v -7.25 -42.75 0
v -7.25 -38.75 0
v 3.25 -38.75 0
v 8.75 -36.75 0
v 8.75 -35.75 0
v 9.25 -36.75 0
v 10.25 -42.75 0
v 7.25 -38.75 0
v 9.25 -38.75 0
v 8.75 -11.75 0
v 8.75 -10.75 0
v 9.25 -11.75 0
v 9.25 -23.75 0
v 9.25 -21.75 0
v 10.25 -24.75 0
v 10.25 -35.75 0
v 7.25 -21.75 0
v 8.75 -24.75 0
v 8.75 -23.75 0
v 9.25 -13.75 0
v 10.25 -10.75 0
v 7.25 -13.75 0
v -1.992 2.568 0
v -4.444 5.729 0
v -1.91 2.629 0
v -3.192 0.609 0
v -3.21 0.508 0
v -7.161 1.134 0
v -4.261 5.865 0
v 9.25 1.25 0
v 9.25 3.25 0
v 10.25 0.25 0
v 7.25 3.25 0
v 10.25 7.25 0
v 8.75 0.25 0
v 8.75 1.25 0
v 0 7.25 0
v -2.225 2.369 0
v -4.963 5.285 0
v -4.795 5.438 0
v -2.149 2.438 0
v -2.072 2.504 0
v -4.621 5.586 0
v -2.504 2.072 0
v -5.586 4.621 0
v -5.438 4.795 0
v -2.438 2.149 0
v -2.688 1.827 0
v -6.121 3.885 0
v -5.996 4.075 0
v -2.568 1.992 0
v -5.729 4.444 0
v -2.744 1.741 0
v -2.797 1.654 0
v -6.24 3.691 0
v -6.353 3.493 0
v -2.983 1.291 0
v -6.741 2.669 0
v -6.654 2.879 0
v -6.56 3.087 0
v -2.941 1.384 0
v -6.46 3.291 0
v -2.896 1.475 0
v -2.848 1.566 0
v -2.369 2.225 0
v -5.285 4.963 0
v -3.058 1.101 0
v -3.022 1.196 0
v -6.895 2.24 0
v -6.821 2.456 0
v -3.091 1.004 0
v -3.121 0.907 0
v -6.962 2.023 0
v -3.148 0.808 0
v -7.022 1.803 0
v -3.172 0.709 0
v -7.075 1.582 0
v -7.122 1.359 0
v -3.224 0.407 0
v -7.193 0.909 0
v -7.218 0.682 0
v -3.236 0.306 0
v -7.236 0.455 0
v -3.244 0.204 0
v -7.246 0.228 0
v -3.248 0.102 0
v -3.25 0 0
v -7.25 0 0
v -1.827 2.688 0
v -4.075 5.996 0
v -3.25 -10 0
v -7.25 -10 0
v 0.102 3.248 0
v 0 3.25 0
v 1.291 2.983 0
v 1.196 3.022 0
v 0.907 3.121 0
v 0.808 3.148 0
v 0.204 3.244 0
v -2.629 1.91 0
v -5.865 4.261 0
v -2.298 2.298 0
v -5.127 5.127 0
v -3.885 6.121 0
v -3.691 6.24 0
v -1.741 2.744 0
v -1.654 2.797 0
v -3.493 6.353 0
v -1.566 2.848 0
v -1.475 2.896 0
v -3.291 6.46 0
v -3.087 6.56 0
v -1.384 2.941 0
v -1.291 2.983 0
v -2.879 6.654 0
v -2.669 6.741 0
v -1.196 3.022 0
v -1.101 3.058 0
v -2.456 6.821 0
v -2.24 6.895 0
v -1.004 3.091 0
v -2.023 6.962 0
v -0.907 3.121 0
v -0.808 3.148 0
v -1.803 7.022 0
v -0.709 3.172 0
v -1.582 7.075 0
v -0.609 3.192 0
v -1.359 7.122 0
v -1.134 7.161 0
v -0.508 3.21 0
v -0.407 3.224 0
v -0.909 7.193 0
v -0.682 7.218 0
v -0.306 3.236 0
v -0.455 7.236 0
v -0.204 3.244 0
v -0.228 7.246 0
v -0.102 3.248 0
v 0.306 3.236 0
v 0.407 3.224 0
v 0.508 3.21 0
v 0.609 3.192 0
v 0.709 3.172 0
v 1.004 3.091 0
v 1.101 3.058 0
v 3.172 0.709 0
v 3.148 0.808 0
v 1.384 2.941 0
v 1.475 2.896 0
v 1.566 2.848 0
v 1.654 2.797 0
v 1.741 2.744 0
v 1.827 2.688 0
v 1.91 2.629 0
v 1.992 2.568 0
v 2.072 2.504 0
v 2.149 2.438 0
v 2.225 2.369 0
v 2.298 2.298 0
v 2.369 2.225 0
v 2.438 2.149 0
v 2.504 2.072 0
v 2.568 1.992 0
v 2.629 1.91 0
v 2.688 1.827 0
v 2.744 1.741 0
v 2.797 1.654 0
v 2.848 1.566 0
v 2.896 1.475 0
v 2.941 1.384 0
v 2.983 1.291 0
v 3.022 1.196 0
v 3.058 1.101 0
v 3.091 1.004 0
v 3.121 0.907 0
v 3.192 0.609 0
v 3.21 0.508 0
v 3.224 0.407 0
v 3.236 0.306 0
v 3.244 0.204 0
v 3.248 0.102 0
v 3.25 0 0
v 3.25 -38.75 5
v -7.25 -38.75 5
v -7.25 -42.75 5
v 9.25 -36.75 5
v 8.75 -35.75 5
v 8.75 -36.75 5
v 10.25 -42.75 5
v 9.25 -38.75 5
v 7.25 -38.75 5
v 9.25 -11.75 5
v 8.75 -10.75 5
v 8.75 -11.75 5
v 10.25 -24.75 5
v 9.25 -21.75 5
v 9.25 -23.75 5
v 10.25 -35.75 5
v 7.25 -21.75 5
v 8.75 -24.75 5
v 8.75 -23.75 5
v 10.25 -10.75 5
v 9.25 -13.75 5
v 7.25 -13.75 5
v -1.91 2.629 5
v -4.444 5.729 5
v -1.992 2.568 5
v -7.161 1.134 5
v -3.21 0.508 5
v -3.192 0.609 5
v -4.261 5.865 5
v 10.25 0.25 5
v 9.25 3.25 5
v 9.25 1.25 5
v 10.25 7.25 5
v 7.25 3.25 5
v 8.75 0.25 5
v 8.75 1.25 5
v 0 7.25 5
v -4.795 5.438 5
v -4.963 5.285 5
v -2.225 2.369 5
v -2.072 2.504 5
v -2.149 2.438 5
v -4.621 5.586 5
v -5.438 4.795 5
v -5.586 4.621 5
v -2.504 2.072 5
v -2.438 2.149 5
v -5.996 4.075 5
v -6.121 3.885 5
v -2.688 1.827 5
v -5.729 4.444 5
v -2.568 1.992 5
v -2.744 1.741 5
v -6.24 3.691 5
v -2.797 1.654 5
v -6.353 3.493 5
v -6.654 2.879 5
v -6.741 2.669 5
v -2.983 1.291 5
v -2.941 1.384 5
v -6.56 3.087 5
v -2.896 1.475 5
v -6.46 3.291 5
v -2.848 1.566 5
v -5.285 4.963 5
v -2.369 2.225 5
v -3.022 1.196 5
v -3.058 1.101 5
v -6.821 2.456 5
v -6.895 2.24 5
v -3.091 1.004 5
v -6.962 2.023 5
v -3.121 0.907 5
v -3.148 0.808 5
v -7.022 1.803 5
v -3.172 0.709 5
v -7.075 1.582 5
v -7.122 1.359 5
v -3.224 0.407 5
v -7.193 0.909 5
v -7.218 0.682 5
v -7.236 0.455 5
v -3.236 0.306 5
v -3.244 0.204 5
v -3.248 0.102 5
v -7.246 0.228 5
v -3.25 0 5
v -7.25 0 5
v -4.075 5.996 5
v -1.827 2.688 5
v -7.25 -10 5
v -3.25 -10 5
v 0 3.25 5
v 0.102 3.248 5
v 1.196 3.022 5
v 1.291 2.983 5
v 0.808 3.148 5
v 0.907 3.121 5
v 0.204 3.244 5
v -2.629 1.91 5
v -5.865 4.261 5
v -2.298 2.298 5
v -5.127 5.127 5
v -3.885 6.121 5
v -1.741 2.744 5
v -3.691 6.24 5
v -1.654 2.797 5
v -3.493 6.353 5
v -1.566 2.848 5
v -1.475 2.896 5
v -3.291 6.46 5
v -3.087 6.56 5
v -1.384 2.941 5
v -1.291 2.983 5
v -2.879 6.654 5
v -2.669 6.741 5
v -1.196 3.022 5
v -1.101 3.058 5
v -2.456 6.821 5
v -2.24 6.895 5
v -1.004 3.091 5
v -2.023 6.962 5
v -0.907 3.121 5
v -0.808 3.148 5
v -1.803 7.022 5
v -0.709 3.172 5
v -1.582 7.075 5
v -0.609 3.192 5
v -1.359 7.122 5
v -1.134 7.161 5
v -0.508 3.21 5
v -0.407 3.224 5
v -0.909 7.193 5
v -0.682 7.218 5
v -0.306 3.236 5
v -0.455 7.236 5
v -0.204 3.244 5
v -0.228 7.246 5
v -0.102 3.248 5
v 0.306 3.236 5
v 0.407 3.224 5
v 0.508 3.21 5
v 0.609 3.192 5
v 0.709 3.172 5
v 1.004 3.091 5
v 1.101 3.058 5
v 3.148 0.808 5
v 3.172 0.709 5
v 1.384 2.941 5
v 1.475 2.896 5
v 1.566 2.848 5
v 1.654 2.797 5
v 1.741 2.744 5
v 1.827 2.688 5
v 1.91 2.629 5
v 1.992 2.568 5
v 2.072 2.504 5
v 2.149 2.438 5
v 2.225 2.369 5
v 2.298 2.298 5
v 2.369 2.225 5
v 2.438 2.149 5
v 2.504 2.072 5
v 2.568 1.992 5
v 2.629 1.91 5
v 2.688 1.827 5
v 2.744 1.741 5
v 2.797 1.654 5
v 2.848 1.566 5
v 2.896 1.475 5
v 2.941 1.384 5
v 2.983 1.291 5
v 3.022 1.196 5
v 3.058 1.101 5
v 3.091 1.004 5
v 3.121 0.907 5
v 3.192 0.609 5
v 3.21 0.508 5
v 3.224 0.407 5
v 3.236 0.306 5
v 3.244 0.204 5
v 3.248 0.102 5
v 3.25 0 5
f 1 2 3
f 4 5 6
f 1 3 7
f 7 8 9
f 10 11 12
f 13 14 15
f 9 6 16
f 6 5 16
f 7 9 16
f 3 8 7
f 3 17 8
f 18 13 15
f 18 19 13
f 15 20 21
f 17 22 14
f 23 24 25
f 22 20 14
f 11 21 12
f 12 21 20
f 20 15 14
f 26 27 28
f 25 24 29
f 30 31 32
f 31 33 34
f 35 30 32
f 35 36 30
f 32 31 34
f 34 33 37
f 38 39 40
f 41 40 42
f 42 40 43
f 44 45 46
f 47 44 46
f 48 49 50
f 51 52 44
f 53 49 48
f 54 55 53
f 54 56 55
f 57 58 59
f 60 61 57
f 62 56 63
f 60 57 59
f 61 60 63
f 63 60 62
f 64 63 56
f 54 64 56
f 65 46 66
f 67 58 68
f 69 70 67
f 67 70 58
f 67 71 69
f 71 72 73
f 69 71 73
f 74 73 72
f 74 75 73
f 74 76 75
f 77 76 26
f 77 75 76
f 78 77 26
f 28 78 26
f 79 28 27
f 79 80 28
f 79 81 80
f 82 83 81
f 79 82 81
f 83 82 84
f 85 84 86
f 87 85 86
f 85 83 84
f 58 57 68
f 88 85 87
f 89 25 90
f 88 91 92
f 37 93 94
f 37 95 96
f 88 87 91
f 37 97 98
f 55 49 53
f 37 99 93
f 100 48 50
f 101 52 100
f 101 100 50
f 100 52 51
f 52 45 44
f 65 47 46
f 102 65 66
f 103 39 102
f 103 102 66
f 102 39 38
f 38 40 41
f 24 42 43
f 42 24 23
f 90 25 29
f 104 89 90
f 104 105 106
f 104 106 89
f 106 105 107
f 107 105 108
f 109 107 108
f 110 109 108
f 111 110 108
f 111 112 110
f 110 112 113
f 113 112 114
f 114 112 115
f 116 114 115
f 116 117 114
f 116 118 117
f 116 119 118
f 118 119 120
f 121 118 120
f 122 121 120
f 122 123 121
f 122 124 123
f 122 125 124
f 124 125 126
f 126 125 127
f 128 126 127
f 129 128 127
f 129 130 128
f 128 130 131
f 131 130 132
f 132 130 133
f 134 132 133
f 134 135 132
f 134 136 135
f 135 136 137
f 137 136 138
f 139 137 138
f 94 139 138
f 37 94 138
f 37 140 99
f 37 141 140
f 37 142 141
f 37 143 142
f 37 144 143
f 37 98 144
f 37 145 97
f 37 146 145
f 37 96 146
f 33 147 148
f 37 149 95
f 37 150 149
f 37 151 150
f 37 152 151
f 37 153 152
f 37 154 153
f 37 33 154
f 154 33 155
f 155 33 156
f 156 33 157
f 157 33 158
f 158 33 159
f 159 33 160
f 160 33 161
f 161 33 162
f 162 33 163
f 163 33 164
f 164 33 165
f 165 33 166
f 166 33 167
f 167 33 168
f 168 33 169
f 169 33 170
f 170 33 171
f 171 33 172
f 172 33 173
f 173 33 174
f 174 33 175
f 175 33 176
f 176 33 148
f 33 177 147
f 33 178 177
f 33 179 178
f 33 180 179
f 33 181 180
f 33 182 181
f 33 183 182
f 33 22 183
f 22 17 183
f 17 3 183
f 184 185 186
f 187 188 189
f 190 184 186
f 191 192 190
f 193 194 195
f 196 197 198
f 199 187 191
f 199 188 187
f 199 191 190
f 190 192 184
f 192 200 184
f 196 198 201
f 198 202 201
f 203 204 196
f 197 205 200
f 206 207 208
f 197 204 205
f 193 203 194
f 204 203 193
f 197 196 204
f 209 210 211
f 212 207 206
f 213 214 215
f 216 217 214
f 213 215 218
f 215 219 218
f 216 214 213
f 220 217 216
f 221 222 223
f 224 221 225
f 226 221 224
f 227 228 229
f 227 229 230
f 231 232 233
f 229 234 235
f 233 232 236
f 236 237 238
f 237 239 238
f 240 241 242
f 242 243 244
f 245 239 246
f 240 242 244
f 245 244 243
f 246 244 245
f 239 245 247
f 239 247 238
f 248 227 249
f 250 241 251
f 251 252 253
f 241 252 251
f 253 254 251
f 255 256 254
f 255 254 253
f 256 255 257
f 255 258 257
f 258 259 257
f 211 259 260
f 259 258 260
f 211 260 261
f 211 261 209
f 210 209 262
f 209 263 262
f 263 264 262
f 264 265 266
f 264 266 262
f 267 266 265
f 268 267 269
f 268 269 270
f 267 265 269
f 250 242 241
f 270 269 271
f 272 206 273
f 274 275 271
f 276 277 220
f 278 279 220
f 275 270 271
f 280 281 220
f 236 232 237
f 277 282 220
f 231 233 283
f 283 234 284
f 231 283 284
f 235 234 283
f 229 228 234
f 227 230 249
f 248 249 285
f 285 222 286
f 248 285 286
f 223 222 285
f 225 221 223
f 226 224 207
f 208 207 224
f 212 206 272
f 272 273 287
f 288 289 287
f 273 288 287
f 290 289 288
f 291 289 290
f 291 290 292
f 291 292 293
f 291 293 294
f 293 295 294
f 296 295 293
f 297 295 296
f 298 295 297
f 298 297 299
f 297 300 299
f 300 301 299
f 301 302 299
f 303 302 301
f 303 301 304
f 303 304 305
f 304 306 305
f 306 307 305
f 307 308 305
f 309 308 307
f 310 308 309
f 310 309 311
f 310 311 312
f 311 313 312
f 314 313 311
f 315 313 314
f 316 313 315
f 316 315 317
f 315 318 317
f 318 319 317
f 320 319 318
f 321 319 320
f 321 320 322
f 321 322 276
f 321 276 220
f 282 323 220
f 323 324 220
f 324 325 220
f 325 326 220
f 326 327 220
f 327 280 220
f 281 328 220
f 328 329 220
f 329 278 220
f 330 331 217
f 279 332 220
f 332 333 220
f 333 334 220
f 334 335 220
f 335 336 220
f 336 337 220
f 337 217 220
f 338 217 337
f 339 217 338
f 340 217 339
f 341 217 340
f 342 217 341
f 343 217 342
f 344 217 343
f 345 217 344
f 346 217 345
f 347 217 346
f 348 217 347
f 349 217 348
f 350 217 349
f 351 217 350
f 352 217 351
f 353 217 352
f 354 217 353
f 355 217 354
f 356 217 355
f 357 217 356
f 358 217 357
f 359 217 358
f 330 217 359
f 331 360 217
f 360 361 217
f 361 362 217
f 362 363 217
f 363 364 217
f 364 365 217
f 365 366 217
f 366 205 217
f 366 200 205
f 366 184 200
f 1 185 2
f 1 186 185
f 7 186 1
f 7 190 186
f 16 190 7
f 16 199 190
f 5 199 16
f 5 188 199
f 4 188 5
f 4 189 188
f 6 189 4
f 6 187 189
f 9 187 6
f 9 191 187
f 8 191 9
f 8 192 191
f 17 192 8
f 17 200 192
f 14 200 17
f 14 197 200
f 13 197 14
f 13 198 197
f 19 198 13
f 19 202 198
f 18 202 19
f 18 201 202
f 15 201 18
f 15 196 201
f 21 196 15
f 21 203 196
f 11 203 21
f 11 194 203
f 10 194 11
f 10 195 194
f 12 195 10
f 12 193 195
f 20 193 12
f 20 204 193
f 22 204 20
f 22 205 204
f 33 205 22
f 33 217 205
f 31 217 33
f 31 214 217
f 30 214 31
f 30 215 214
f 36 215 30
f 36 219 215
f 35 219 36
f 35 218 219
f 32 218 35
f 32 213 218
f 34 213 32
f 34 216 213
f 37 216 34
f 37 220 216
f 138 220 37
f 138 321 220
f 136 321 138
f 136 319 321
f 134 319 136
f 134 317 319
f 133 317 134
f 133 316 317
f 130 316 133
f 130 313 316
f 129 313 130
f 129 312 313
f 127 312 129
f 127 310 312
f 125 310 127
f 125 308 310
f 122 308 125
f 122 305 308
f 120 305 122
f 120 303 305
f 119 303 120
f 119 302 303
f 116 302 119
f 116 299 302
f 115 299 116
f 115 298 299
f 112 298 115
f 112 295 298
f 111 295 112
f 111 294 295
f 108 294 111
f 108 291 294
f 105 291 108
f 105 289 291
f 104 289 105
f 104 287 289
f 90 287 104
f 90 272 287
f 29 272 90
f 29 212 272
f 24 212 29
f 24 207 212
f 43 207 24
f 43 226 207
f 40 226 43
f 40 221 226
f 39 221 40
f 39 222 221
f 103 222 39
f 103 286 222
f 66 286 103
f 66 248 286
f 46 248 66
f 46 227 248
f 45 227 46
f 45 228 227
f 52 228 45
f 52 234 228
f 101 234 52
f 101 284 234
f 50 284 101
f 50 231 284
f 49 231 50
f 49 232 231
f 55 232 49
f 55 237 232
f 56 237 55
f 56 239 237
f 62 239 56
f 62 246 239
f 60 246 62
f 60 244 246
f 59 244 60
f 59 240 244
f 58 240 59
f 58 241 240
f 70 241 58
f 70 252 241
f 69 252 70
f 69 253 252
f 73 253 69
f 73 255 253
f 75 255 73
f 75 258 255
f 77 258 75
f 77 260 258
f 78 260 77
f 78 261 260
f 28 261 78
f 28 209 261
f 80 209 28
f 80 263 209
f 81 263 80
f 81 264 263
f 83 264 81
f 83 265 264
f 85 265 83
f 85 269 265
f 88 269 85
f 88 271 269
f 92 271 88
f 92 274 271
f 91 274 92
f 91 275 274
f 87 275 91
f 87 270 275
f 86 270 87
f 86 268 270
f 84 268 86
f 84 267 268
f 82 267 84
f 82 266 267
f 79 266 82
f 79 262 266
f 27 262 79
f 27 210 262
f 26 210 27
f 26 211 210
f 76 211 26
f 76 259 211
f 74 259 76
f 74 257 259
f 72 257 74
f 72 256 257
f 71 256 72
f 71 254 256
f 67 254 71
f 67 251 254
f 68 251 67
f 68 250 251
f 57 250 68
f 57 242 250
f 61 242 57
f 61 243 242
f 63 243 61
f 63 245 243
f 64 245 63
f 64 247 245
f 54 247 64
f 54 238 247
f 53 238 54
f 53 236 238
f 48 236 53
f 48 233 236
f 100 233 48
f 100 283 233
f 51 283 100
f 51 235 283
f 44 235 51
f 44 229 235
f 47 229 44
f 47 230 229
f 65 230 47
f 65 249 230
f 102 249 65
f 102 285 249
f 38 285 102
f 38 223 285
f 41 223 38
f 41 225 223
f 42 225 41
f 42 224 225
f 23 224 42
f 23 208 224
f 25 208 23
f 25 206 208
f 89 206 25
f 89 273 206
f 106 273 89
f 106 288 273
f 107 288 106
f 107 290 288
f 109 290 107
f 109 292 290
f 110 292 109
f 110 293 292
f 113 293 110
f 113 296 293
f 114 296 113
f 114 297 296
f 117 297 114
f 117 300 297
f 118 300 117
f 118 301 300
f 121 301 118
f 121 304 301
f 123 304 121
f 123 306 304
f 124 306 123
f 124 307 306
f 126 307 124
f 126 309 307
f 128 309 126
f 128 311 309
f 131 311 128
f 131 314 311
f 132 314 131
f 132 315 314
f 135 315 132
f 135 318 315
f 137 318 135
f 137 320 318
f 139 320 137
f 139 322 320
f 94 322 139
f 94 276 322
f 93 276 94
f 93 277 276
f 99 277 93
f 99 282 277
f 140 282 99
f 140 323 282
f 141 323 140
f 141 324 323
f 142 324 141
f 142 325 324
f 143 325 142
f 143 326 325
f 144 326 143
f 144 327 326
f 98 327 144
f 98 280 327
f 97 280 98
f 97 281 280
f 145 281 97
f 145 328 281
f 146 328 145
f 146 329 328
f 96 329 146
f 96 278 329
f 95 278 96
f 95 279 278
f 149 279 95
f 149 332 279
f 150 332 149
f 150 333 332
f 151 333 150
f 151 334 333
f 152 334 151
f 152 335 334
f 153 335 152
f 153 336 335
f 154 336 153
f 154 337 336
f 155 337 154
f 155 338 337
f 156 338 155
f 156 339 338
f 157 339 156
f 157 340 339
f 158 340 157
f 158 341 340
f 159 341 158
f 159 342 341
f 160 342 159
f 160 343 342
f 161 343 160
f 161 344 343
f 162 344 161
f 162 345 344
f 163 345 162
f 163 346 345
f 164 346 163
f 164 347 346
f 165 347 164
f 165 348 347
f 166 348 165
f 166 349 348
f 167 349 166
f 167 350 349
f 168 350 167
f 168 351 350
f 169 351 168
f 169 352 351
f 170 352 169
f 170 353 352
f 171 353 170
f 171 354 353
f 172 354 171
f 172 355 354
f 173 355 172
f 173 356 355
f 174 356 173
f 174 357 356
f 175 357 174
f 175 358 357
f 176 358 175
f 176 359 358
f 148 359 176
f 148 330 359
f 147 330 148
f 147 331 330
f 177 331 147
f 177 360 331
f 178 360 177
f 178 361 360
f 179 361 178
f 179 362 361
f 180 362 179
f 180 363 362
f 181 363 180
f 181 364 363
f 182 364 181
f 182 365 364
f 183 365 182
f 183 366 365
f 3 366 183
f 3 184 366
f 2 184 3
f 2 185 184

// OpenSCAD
$fn=200;
rackHeight=38.75;
rackPinInnerDiameter=6.5;
rackBackLength=10;
hookDepth=4;
hookWidth=35;
endHookScale=3;


linear_extrude(5) {
    difference() {
        difference() {
            circle(d=rackPinInnerDiameter+(hookDepth*2));
            circle(d=rackPinInnerDiameter);
        }
        translate([0,-(rackPinInnerDiameter+(hookDepth*2))/2,0]) square(rackPinInnerDiameter+(hookDepth*2), true);
    }
    translate([rackPinInnerDiameter/2,-rackHeight,0]) square([hookDepth, rackHeight]);
    translate([-(rackPinInnerDiameter/2 + hookDepth),-rackBackLength,0]) square([hookDepth, rackBackLength]);
    translate([0,-(rackHeight+(hookDepth/2)),0]) square([rackPinInnerDiameter+(hookDepth*2), hookDepth], true);
    translate([0,rackPinInnerDiameter/2, 0]) square([rackPinInnerDiameter/2+hookDepth, hookDepth]);
    translate([rackPinInnerDiameter/2, 0, 0]) square([hookDepth, hookDepth+1]);
    
    translate([rackPinInnerDiameter/2+7, -42.75]) rotate(90) badgeAcceptor();
}


//badgeEnd();

module badgeEnd() {
    translate([0,-2.5]) square([50,2.5]);
    translate([7, 0]) badgeClasp();
    translate([7+14+11, 0]) badgeClasp();
}

module badgeClasp() {
    translate([0,0]) square([11,1.5]);
    translate([-2, 1.5]) square([3,1]);
    translate([11-1, 1.5]) square([3,1]);
    translate([-2, 1]) square([0.5,0.5]);
    translate([12.5, 1]) square([0.5,0.5]);
}

module badgeAcceptor() {
    translate([0,0]) square([7,1]);
    translate([6,1]) square([1,0.5]);

    translate([7+11, 0]) square([14,1]);
    translate([7+11,1]) square([1,0.5]);
    translate([7+11+13,1]) square([1,0.5]);

    translate([7+11+14+11,0]) square([7,1]);
    translate([7+11+14+11,1]) square([1,0.5]);

    translate([0,0]) square([4,3]);
    translate([7+11+14+11+3,0]) square([4,3]);
    translate([7+11+3, 0]) square([8,3]);
}

//1.5mm 1mm
//14.50mm outer 11.5 inner 11mm split
